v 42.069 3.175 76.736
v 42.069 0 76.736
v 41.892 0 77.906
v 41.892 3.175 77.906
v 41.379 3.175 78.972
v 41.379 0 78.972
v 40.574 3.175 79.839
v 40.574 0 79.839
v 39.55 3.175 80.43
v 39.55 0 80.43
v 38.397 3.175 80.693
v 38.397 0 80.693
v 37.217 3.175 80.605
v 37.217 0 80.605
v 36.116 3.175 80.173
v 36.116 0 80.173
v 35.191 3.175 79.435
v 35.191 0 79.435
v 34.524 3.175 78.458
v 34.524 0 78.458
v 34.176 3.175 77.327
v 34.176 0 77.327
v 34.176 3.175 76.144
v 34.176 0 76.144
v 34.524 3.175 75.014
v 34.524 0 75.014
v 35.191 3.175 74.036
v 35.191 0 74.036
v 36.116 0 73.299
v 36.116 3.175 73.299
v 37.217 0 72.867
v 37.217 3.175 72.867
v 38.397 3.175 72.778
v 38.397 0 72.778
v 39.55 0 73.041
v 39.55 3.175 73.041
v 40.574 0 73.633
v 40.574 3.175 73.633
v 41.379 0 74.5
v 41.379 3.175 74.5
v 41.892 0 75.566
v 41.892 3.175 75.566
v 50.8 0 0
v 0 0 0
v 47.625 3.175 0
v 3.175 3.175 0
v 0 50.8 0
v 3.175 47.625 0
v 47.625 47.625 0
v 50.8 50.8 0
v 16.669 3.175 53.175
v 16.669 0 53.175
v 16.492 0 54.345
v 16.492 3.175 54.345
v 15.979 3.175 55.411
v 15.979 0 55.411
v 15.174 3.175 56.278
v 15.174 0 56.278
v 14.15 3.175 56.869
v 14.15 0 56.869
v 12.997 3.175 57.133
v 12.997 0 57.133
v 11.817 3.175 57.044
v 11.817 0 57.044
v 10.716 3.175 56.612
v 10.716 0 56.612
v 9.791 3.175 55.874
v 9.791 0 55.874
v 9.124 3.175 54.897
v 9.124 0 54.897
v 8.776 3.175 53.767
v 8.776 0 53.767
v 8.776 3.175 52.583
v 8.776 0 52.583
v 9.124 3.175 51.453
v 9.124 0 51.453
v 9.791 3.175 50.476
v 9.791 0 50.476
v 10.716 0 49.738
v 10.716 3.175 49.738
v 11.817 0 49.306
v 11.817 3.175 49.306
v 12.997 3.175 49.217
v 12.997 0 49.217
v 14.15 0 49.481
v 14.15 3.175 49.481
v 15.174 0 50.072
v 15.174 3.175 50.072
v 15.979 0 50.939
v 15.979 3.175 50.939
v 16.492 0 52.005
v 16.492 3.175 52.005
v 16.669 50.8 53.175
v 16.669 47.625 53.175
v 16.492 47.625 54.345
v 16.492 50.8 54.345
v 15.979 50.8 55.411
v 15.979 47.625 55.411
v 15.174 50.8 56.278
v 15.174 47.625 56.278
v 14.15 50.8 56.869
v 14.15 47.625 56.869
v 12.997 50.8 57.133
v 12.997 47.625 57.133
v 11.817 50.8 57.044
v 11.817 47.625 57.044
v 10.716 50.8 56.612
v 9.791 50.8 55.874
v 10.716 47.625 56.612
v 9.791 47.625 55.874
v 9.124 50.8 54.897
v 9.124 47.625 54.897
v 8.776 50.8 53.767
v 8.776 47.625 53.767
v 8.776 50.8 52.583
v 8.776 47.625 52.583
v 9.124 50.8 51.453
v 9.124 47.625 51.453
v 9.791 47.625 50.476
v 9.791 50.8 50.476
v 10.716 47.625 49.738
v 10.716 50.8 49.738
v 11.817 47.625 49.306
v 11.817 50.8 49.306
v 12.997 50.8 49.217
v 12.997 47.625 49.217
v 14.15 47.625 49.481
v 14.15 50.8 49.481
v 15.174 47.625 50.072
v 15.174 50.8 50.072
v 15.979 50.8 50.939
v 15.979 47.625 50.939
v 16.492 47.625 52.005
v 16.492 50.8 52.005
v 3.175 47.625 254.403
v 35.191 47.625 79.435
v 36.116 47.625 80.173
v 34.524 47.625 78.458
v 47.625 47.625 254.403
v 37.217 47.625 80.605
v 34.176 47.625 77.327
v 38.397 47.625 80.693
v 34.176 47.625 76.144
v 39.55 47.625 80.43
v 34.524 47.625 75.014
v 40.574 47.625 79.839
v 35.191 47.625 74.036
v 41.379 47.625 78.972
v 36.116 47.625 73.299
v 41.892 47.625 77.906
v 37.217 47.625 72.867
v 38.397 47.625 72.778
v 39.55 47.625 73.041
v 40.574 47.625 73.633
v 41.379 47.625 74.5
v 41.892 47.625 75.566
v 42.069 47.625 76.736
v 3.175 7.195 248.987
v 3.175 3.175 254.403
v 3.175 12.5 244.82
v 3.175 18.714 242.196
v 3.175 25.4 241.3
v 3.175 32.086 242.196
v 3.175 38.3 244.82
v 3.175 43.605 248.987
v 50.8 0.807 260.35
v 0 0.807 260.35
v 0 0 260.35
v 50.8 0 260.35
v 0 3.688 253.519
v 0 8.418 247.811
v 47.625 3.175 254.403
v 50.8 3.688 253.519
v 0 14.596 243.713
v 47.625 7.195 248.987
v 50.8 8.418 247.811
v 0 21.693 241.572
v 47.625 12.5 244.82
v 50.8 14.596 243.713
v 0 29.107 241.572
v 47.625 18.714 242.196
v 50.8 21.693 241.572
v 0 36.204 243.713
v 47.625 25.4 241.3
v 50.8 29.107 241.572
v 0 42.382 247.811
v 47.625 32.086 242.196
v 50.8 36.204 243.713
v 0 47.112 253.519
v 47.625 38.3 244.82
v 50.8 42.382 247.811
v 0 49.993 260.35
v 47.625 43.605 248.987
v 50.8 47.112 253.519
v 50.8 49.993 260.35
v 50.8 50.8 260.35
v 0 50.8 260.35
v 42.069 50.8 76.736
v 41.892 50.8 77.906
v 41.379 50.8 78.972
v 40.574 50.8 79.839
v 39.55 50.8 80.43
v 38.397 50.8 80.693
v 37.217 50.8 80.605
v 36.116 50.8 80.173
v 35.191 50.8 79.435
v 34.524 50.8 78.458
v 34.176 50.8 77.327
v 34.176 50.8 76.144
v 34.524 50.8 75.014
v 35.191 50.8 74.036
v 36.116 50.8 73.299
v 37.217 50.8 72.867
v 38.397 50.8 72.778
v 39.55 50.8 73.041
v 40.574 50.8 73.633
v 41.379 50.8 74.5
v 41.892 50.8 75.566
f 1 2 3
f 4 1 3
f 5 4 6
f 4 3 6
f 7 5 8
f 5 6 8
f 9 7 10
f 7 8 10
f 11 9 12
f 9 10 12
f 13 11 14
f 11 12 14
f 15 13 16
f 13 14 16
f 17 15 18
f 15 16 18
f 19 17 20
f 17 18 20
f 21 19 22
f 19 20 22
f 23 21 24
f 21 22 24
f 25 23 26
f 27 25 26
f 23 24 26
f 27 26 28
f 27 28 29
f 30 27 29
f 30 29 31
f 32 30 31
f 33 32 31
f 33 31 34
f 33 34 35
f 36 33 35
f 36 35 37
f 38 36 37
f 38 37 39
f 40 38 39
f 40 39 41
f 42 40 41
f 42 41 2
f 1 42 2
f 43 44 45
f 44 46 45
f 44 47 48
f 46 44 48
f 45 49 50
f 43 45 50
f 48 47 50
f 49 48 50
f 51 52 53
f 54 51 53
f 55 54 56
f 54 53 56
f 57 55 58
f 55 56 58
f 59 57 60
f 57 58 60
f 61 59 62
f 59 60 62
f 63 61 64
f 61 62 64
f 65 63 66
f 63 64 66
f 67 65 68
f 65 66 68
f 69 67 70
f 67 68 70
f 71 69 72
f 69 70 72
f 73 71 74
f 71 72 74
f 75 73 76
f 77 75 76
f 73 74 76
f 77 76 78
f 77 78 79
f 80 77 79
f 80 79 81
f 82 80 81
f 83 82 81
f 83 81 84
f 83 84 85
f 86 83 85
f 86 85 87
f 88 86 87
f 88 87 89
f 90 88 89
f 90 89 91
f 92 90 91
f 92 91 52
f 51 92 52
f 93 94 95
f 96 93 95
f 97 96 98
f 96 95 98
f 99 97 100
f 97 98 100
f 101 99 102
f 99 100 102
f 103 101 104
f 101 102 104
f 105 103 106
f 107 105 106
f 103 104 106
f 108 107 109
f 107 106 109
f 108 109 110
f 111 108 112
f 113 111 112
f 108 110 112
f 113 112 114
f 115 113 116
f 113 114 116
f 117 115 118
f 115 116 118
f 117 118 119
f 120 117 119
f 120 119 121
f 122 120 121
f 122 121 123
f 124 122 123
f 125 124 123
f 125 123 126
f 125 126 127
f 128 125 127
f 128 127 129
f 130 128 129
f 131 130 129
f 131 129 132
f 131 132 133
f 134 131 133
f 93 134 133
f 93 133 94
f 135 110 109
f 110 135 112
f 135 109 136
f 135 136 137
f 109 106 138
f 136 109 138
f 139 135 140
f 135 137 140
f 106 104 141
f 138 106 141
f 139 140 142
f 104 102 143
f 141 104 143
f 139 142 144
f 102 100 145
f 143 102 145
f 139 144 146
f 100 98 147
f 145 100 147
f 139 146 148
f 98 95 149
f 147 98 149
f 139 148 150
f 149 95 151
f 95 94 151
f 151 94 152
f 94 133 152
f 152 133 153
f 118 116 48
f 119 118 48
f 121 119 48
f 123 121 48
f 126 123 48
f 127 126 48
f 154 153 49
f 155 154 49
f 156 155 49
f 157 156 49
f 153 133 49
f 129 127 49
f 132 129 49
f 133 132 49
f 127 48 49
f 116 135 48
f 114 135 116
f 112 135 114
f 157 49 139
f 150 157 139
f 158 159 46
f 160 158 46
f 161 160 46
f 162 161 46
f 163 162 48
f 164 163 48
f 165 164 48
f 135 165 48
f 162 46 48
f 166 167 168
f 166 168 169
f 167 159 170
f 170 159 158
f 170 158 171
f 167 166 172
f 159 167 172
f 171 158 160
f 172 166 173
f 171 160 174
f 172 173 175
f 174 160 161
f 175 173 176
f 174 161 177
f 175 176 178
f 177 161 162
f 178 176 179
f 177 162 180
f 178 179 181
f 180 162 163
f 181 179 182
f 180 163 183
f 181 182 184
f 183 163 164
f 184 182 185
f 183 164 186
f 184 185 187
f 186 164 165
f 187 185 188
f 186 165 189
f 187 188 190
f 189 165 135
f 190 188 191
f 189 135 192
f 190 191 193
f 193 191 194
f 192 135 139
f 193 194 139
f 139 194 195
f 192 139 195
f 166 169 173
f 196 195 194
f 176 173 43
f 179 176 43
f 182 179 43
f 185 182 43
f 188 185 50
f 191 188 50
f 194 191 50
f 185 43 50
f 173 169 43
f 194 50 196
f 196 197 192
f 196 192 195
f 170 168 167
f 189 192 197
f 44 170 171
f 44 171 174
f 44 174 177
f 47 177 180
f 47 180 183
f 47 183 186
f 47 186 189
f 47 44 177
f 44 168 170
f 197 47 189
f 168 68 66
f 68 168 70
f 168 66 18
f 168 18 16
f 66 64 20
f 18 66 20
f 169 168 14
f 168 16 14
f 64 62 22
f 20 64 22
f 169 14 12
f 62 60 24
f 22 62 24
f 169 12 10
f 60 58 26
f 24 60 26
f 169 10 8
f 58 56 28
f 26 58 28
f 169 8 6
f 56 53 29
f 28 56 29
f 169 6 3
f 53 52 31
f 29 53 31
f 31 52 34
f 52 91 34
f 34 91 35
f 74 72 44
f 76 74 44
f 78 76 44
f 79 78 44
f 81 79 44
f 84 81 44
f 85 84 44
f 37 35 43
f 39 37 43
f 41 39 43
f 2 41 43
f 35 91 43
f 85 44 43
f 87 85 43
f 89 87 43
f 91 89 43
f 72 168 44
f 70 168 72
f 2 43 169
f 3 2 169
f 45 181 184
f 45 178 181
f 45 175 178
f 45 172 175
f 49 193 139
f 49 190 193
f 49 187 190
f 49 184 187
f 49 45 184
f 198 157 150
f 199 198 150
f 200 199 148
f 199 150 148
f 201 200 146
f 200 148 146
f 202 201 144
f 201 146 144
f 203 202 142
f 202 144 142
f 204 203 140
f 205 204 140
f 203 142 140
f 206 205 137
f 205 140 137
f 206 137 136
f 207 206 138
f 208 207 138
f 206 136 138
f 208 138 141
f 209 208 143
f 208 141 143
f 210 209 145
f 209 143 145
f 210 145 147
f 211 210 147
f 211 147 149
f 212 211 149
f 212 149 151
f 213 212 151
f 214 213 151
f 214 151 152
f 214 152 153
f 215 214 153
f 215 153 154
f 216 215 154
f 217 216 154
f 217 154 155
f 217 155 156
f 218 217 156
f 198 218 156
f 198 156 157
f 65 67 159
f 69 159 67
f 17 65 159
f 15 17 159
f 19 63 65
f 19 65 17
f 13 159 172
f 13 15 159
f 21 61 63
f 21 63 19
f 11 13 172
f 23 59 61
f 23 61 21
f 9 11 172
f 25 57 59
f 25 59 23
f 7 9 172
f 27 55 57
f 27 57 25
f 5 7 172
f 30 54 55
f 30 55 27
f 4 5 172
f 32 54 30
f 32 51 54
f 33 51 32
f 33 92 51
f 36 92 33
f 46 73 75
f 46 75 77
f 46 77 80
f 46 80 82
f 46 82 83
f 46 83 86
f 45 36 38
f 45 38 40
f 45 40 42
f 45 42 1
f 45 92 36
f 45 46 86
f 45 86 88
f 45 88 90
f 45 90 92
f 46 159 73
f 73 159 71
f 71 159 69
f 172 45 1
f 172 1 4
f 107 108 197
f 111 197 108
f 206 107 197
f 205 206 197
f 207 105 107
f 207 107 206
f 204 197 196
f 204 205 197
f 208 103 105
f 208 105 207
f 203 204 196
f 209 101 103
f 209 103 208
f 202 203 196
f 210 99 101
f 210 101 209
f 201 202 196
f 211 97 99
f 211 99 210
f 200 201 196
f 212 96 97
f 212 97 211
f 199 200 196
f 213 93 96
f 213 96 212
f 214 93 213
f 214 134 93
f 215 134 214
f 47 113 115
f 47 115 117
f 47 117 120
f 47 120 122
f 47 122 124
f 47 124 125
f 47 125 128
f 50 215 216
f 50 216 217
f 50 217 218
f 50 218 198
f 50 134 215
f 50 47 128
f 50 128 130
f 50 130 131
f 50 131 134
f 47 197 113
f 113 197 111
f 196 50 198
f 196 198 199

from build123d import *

# Parameters (mm, degrees)
SKETCH1_W           = 50.8
SKETCH1_H           = 50.8
SKETCH1_W_2         = 44.45
SKETCH1_H_2         = 44.45
BOSS_EXTRUDE1_DEPTH = 260.35
SKETCH2_R           = 25.4
CUT_EXTRUDE1_DEPTH  = 51.8
SKETCH3_R           = 3.96875
CUT_EXTRUDE2_DEPTH  = 51.8


with BuildPart() as part:
    # Sketch1 → Boss-Extrude1 (new body)
    with BuildSketch(Plane.XY):
        with Locations((25.4, 25.4)):
            Rectangle(SKETCH1_W, SKETCH1_H)
        with Locations((25.4, 25.4)):
            Rectangle(SKETCH1_W_2, SKETCH1_H_2, mode=Mode.SUBTRACT)
    extrude(amount=BOSS_EXTRUDE1_DEPTH)

    # Sketch2 → Cut-Extrude1 (cut, through all)
    with BuildSketch(Plane(origin=(50.8, 0, 0), x_dir=(0, 0, -1), z_dir=(1, 0, 0))):
        with Locations((-266.7, 25.4)):
            Circle(SKETCH2_R)
    extrude(amount=-CUT_EXTRUDE1_DEPTH, mode=Mode.SUBTRACT)

    # Sketch3 → Cut-Extrude2 (cut, through all)
    with BuildSketch(Plane.XZ):
        with Locations((38.1, 76.735833685)):
            Circle(SKETCH3_R)
        with Locations((12.7, 53.175)):
            Circle(SKETCH3_R)
    extrude(amount=-CUT_EXTRUDE2_DEPTH, mode=Mode.SUBTRACT)


solid = part.part
